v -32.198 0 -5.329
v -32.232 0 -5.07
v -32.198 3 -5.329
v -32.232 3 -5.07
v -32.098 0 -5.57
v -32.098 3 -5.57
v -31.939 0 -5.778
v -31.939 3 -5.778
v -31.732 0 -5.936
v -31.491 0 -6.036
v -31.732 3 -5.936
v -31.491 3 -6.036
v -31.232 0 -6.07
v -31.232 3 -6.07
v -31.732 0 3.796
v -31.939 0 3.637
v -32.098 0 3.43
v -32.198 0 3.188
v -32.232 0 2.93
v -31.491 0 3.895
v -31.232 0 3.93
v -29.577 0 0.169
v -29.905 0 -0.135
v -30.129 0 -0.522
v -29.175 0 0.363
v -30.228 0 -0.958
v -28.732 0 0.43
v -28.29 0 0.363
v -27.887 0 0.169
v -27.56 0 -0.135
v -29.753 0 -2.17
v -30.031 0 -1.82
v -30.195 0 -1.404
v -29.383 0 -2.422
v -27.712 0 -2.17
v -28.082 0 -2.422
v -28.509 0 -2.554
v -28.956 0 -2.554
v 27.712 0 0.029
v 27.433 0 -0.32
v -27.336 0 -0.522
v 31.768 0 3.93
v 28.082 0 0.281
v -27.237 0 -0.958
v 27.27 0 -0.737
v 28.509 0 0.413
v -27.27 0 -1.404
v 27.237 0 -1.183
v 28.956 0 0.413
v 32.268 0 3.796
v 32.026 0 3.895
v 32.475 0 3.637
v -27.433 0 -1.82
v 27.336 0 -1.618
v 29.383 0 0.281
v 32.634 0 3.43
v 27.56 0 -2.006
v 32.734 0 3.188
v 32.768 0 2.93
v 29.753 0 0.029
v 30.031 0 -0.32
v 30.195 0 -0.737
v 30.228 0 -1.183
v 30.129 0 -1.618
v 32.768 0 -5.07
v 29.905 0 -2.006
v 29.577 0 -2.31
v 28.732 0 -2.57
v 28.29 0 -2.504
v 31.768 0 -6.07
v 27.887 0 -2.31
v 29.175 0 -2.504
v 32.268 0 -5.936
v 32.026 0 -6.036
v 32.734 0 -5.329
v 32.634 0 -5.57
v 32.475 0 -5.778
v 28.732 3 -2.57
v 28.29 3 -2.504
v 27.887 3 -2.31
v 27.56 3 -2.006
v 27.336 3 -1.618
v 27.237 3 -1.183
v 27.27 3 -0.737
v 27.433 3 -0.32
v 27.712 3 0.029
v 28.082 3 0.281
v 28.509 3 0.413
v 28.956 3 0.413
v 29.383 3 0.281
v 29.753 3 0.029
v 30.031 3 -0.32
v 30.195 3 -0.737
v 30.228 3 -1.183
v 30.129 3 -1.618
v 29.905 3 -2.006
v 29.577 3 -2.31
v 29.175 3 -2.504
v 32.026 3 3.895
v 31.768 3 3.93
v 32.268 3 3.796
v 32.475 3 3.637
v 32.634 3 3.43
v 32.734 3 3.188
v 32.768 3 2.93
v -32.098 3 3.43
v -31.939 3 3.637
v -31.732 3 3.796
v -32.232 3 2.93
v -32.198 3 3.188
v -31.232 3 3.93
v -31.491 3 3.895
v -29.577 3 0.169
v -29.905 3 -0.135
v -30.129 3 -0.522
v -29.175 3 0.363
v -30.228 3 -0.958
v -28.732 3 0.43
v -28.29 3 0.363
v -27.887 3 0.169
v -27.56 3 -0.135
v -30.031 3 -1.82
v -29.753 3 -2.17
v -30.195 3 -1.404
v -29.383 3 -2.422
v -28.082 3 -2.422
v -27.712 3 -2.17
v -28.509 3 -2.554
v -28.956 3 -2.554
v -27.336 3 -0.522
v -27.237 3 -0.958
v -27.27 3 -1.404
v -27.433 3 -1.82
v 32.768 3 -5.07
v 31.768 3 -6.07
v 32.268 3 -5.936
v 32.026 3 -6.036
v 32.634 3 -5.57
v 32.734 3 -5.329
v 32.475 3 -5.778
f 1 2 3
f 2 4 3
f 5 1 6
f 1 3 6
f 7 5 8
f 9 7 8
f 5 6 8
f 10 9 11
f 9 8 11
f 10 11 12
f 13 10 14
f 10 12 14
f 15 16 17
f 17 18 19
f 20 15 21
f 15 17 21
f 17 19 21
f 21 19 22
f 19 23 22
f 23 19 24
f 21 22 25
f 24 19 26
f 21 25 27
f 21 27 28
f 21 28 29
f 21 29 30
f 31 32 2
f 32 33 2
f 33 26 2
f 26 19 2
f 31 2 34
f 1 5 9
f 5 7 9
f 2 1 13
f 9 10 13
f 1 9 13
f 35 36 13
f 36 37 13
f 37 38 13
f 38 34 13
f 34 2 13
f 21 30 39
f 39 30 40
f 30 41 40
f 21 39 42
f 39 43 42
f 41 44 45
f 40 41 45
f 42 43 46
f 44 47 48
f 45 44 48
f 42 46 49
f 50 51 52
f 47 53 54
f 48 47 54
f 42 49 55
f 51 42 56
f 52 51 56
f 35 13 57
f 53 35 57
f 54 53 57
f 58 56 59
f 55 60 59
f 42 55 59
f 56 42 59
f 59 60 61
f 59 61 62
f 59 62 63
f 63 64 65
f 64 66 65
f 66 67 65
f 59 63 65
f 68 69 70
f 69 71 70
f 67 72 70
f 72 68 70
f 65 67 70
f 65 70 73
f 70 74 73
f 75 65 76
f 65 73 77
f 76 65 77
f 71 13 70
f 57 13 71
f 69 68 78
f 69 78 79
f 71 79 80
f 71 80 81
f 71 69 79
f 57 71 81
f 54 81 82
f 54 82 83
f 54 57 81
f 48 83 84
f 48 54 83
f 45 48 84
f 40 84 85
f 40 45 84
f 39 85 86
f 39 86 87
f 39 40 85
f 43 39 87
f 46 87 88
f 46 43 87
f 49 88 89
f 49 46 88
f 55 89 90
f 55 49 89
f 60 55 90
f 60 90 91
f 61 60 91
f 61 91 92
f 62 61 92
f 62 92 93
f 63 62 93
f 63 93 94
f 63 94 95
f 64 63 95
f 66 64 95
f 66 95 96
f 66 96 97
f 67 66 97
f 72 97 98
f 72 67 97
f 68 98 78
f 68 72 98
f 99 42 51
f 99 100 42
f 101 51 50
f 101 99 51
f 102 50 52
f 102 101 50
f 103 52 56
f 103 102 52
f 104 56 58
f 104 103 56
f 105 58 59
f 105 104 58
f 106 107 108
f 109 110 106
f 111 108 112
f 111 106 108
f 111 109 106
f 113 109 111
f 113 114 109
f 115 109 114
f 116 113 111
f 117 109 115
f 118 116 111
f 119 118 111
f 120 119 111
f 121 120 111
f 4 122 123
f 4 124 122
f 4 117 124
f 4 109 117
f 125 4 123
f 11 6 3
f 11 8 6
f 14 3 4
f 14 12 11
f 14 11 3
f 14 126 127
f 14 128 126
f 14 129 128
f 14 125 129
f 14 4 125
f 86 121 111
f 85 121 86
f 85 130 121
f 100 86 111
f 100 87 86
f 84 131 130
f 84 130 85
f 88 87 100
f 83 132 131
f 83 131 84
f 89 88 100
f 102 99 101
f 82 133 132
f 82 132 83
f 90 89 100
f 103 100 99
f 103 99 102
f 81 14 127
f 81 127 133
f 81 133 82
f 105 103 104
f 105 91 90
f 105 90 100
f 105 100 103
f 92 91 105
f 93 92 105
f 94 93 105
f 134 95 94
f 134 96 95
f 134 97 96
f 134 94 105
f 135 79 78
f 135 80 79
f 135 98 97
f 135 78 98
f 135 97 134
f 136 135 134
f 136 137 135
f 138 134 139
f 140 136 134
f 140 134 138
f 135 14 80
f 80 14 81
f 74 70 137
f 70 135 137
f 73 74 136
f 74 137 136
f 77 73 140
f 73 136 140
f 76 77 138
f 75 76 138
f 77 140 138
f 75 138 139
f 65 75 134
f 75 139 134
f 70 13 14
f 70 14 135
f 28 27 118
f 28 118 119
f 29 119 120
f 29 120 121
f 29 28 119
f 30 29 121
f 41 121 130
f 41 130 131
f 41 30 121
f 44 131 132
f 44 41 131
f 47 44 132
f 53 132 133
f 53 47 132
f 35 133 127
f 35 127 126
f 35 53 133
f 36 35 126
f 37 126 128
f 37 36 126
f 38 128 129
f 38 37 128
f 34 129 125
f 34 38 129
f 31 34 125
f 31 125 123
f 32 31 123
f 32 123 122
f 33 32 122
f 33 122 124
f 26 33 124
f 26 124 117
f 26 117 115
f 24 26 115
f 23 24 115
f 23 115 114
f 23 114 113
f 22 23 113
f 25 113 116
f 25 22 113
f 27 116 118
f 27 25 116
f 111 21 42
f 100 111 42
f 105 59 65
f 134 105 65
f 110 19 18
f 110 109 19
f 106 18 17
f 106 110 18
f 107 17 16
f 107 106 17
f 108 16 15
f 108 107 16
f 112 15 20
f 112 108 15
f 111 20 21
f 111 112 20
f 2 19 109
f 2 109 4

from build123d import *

# Parameters (mm, degrees)
CROQUIS1_W              = 65
CROQUIS1_H              = 10
CROQUIS1_R              = 1.5
SALIENTE_EXTRUIR1_DEPTH = 3
REDONDEO1_R             = 1


with BuildPart() as part:
    # Croquis1 → Saliente-Extruir1 (new body)
    with BuildSketch(Plane(origin=(0, 0, 0), x_dir=(1, 0, 0), z_dir=(0, 1, 0))):
        with Locations((0.267609294, 1.070437174)):
            Rectangle(CROQUIS1_W, CROQUIS1_H)
        with Locations(Location((-28.732390706, 1.070437174, 0), (0, 0, 270))):
            Circle(CROQUIS1_R, mode=Mode.SUBTRACT)
        with Locations(Location((28.732390706, 1.070437174, 0), (0, 0, 90))):
            Circle(CROQUIS1_R, mode=Mode.SUBTRACT)
    extrude(amount=SALIENTE_EXTRUIR1_DEPTH)

    # Redondeo1
    redondeo1_edges = [part.edges().sort_by_distance(p)[0] for p in [
        (32.767609294, 1.5, 3.929562826),
        (-32.232390706, 1.5, 3.929562826),
        (-32.232390706, 1.5, -6.070437174),
        (32.767609294, 1.5, -6.070437174),
    ]]
    fillet(redondeo1_edges, radius=REDONDEO1_R)


solid = part.part
